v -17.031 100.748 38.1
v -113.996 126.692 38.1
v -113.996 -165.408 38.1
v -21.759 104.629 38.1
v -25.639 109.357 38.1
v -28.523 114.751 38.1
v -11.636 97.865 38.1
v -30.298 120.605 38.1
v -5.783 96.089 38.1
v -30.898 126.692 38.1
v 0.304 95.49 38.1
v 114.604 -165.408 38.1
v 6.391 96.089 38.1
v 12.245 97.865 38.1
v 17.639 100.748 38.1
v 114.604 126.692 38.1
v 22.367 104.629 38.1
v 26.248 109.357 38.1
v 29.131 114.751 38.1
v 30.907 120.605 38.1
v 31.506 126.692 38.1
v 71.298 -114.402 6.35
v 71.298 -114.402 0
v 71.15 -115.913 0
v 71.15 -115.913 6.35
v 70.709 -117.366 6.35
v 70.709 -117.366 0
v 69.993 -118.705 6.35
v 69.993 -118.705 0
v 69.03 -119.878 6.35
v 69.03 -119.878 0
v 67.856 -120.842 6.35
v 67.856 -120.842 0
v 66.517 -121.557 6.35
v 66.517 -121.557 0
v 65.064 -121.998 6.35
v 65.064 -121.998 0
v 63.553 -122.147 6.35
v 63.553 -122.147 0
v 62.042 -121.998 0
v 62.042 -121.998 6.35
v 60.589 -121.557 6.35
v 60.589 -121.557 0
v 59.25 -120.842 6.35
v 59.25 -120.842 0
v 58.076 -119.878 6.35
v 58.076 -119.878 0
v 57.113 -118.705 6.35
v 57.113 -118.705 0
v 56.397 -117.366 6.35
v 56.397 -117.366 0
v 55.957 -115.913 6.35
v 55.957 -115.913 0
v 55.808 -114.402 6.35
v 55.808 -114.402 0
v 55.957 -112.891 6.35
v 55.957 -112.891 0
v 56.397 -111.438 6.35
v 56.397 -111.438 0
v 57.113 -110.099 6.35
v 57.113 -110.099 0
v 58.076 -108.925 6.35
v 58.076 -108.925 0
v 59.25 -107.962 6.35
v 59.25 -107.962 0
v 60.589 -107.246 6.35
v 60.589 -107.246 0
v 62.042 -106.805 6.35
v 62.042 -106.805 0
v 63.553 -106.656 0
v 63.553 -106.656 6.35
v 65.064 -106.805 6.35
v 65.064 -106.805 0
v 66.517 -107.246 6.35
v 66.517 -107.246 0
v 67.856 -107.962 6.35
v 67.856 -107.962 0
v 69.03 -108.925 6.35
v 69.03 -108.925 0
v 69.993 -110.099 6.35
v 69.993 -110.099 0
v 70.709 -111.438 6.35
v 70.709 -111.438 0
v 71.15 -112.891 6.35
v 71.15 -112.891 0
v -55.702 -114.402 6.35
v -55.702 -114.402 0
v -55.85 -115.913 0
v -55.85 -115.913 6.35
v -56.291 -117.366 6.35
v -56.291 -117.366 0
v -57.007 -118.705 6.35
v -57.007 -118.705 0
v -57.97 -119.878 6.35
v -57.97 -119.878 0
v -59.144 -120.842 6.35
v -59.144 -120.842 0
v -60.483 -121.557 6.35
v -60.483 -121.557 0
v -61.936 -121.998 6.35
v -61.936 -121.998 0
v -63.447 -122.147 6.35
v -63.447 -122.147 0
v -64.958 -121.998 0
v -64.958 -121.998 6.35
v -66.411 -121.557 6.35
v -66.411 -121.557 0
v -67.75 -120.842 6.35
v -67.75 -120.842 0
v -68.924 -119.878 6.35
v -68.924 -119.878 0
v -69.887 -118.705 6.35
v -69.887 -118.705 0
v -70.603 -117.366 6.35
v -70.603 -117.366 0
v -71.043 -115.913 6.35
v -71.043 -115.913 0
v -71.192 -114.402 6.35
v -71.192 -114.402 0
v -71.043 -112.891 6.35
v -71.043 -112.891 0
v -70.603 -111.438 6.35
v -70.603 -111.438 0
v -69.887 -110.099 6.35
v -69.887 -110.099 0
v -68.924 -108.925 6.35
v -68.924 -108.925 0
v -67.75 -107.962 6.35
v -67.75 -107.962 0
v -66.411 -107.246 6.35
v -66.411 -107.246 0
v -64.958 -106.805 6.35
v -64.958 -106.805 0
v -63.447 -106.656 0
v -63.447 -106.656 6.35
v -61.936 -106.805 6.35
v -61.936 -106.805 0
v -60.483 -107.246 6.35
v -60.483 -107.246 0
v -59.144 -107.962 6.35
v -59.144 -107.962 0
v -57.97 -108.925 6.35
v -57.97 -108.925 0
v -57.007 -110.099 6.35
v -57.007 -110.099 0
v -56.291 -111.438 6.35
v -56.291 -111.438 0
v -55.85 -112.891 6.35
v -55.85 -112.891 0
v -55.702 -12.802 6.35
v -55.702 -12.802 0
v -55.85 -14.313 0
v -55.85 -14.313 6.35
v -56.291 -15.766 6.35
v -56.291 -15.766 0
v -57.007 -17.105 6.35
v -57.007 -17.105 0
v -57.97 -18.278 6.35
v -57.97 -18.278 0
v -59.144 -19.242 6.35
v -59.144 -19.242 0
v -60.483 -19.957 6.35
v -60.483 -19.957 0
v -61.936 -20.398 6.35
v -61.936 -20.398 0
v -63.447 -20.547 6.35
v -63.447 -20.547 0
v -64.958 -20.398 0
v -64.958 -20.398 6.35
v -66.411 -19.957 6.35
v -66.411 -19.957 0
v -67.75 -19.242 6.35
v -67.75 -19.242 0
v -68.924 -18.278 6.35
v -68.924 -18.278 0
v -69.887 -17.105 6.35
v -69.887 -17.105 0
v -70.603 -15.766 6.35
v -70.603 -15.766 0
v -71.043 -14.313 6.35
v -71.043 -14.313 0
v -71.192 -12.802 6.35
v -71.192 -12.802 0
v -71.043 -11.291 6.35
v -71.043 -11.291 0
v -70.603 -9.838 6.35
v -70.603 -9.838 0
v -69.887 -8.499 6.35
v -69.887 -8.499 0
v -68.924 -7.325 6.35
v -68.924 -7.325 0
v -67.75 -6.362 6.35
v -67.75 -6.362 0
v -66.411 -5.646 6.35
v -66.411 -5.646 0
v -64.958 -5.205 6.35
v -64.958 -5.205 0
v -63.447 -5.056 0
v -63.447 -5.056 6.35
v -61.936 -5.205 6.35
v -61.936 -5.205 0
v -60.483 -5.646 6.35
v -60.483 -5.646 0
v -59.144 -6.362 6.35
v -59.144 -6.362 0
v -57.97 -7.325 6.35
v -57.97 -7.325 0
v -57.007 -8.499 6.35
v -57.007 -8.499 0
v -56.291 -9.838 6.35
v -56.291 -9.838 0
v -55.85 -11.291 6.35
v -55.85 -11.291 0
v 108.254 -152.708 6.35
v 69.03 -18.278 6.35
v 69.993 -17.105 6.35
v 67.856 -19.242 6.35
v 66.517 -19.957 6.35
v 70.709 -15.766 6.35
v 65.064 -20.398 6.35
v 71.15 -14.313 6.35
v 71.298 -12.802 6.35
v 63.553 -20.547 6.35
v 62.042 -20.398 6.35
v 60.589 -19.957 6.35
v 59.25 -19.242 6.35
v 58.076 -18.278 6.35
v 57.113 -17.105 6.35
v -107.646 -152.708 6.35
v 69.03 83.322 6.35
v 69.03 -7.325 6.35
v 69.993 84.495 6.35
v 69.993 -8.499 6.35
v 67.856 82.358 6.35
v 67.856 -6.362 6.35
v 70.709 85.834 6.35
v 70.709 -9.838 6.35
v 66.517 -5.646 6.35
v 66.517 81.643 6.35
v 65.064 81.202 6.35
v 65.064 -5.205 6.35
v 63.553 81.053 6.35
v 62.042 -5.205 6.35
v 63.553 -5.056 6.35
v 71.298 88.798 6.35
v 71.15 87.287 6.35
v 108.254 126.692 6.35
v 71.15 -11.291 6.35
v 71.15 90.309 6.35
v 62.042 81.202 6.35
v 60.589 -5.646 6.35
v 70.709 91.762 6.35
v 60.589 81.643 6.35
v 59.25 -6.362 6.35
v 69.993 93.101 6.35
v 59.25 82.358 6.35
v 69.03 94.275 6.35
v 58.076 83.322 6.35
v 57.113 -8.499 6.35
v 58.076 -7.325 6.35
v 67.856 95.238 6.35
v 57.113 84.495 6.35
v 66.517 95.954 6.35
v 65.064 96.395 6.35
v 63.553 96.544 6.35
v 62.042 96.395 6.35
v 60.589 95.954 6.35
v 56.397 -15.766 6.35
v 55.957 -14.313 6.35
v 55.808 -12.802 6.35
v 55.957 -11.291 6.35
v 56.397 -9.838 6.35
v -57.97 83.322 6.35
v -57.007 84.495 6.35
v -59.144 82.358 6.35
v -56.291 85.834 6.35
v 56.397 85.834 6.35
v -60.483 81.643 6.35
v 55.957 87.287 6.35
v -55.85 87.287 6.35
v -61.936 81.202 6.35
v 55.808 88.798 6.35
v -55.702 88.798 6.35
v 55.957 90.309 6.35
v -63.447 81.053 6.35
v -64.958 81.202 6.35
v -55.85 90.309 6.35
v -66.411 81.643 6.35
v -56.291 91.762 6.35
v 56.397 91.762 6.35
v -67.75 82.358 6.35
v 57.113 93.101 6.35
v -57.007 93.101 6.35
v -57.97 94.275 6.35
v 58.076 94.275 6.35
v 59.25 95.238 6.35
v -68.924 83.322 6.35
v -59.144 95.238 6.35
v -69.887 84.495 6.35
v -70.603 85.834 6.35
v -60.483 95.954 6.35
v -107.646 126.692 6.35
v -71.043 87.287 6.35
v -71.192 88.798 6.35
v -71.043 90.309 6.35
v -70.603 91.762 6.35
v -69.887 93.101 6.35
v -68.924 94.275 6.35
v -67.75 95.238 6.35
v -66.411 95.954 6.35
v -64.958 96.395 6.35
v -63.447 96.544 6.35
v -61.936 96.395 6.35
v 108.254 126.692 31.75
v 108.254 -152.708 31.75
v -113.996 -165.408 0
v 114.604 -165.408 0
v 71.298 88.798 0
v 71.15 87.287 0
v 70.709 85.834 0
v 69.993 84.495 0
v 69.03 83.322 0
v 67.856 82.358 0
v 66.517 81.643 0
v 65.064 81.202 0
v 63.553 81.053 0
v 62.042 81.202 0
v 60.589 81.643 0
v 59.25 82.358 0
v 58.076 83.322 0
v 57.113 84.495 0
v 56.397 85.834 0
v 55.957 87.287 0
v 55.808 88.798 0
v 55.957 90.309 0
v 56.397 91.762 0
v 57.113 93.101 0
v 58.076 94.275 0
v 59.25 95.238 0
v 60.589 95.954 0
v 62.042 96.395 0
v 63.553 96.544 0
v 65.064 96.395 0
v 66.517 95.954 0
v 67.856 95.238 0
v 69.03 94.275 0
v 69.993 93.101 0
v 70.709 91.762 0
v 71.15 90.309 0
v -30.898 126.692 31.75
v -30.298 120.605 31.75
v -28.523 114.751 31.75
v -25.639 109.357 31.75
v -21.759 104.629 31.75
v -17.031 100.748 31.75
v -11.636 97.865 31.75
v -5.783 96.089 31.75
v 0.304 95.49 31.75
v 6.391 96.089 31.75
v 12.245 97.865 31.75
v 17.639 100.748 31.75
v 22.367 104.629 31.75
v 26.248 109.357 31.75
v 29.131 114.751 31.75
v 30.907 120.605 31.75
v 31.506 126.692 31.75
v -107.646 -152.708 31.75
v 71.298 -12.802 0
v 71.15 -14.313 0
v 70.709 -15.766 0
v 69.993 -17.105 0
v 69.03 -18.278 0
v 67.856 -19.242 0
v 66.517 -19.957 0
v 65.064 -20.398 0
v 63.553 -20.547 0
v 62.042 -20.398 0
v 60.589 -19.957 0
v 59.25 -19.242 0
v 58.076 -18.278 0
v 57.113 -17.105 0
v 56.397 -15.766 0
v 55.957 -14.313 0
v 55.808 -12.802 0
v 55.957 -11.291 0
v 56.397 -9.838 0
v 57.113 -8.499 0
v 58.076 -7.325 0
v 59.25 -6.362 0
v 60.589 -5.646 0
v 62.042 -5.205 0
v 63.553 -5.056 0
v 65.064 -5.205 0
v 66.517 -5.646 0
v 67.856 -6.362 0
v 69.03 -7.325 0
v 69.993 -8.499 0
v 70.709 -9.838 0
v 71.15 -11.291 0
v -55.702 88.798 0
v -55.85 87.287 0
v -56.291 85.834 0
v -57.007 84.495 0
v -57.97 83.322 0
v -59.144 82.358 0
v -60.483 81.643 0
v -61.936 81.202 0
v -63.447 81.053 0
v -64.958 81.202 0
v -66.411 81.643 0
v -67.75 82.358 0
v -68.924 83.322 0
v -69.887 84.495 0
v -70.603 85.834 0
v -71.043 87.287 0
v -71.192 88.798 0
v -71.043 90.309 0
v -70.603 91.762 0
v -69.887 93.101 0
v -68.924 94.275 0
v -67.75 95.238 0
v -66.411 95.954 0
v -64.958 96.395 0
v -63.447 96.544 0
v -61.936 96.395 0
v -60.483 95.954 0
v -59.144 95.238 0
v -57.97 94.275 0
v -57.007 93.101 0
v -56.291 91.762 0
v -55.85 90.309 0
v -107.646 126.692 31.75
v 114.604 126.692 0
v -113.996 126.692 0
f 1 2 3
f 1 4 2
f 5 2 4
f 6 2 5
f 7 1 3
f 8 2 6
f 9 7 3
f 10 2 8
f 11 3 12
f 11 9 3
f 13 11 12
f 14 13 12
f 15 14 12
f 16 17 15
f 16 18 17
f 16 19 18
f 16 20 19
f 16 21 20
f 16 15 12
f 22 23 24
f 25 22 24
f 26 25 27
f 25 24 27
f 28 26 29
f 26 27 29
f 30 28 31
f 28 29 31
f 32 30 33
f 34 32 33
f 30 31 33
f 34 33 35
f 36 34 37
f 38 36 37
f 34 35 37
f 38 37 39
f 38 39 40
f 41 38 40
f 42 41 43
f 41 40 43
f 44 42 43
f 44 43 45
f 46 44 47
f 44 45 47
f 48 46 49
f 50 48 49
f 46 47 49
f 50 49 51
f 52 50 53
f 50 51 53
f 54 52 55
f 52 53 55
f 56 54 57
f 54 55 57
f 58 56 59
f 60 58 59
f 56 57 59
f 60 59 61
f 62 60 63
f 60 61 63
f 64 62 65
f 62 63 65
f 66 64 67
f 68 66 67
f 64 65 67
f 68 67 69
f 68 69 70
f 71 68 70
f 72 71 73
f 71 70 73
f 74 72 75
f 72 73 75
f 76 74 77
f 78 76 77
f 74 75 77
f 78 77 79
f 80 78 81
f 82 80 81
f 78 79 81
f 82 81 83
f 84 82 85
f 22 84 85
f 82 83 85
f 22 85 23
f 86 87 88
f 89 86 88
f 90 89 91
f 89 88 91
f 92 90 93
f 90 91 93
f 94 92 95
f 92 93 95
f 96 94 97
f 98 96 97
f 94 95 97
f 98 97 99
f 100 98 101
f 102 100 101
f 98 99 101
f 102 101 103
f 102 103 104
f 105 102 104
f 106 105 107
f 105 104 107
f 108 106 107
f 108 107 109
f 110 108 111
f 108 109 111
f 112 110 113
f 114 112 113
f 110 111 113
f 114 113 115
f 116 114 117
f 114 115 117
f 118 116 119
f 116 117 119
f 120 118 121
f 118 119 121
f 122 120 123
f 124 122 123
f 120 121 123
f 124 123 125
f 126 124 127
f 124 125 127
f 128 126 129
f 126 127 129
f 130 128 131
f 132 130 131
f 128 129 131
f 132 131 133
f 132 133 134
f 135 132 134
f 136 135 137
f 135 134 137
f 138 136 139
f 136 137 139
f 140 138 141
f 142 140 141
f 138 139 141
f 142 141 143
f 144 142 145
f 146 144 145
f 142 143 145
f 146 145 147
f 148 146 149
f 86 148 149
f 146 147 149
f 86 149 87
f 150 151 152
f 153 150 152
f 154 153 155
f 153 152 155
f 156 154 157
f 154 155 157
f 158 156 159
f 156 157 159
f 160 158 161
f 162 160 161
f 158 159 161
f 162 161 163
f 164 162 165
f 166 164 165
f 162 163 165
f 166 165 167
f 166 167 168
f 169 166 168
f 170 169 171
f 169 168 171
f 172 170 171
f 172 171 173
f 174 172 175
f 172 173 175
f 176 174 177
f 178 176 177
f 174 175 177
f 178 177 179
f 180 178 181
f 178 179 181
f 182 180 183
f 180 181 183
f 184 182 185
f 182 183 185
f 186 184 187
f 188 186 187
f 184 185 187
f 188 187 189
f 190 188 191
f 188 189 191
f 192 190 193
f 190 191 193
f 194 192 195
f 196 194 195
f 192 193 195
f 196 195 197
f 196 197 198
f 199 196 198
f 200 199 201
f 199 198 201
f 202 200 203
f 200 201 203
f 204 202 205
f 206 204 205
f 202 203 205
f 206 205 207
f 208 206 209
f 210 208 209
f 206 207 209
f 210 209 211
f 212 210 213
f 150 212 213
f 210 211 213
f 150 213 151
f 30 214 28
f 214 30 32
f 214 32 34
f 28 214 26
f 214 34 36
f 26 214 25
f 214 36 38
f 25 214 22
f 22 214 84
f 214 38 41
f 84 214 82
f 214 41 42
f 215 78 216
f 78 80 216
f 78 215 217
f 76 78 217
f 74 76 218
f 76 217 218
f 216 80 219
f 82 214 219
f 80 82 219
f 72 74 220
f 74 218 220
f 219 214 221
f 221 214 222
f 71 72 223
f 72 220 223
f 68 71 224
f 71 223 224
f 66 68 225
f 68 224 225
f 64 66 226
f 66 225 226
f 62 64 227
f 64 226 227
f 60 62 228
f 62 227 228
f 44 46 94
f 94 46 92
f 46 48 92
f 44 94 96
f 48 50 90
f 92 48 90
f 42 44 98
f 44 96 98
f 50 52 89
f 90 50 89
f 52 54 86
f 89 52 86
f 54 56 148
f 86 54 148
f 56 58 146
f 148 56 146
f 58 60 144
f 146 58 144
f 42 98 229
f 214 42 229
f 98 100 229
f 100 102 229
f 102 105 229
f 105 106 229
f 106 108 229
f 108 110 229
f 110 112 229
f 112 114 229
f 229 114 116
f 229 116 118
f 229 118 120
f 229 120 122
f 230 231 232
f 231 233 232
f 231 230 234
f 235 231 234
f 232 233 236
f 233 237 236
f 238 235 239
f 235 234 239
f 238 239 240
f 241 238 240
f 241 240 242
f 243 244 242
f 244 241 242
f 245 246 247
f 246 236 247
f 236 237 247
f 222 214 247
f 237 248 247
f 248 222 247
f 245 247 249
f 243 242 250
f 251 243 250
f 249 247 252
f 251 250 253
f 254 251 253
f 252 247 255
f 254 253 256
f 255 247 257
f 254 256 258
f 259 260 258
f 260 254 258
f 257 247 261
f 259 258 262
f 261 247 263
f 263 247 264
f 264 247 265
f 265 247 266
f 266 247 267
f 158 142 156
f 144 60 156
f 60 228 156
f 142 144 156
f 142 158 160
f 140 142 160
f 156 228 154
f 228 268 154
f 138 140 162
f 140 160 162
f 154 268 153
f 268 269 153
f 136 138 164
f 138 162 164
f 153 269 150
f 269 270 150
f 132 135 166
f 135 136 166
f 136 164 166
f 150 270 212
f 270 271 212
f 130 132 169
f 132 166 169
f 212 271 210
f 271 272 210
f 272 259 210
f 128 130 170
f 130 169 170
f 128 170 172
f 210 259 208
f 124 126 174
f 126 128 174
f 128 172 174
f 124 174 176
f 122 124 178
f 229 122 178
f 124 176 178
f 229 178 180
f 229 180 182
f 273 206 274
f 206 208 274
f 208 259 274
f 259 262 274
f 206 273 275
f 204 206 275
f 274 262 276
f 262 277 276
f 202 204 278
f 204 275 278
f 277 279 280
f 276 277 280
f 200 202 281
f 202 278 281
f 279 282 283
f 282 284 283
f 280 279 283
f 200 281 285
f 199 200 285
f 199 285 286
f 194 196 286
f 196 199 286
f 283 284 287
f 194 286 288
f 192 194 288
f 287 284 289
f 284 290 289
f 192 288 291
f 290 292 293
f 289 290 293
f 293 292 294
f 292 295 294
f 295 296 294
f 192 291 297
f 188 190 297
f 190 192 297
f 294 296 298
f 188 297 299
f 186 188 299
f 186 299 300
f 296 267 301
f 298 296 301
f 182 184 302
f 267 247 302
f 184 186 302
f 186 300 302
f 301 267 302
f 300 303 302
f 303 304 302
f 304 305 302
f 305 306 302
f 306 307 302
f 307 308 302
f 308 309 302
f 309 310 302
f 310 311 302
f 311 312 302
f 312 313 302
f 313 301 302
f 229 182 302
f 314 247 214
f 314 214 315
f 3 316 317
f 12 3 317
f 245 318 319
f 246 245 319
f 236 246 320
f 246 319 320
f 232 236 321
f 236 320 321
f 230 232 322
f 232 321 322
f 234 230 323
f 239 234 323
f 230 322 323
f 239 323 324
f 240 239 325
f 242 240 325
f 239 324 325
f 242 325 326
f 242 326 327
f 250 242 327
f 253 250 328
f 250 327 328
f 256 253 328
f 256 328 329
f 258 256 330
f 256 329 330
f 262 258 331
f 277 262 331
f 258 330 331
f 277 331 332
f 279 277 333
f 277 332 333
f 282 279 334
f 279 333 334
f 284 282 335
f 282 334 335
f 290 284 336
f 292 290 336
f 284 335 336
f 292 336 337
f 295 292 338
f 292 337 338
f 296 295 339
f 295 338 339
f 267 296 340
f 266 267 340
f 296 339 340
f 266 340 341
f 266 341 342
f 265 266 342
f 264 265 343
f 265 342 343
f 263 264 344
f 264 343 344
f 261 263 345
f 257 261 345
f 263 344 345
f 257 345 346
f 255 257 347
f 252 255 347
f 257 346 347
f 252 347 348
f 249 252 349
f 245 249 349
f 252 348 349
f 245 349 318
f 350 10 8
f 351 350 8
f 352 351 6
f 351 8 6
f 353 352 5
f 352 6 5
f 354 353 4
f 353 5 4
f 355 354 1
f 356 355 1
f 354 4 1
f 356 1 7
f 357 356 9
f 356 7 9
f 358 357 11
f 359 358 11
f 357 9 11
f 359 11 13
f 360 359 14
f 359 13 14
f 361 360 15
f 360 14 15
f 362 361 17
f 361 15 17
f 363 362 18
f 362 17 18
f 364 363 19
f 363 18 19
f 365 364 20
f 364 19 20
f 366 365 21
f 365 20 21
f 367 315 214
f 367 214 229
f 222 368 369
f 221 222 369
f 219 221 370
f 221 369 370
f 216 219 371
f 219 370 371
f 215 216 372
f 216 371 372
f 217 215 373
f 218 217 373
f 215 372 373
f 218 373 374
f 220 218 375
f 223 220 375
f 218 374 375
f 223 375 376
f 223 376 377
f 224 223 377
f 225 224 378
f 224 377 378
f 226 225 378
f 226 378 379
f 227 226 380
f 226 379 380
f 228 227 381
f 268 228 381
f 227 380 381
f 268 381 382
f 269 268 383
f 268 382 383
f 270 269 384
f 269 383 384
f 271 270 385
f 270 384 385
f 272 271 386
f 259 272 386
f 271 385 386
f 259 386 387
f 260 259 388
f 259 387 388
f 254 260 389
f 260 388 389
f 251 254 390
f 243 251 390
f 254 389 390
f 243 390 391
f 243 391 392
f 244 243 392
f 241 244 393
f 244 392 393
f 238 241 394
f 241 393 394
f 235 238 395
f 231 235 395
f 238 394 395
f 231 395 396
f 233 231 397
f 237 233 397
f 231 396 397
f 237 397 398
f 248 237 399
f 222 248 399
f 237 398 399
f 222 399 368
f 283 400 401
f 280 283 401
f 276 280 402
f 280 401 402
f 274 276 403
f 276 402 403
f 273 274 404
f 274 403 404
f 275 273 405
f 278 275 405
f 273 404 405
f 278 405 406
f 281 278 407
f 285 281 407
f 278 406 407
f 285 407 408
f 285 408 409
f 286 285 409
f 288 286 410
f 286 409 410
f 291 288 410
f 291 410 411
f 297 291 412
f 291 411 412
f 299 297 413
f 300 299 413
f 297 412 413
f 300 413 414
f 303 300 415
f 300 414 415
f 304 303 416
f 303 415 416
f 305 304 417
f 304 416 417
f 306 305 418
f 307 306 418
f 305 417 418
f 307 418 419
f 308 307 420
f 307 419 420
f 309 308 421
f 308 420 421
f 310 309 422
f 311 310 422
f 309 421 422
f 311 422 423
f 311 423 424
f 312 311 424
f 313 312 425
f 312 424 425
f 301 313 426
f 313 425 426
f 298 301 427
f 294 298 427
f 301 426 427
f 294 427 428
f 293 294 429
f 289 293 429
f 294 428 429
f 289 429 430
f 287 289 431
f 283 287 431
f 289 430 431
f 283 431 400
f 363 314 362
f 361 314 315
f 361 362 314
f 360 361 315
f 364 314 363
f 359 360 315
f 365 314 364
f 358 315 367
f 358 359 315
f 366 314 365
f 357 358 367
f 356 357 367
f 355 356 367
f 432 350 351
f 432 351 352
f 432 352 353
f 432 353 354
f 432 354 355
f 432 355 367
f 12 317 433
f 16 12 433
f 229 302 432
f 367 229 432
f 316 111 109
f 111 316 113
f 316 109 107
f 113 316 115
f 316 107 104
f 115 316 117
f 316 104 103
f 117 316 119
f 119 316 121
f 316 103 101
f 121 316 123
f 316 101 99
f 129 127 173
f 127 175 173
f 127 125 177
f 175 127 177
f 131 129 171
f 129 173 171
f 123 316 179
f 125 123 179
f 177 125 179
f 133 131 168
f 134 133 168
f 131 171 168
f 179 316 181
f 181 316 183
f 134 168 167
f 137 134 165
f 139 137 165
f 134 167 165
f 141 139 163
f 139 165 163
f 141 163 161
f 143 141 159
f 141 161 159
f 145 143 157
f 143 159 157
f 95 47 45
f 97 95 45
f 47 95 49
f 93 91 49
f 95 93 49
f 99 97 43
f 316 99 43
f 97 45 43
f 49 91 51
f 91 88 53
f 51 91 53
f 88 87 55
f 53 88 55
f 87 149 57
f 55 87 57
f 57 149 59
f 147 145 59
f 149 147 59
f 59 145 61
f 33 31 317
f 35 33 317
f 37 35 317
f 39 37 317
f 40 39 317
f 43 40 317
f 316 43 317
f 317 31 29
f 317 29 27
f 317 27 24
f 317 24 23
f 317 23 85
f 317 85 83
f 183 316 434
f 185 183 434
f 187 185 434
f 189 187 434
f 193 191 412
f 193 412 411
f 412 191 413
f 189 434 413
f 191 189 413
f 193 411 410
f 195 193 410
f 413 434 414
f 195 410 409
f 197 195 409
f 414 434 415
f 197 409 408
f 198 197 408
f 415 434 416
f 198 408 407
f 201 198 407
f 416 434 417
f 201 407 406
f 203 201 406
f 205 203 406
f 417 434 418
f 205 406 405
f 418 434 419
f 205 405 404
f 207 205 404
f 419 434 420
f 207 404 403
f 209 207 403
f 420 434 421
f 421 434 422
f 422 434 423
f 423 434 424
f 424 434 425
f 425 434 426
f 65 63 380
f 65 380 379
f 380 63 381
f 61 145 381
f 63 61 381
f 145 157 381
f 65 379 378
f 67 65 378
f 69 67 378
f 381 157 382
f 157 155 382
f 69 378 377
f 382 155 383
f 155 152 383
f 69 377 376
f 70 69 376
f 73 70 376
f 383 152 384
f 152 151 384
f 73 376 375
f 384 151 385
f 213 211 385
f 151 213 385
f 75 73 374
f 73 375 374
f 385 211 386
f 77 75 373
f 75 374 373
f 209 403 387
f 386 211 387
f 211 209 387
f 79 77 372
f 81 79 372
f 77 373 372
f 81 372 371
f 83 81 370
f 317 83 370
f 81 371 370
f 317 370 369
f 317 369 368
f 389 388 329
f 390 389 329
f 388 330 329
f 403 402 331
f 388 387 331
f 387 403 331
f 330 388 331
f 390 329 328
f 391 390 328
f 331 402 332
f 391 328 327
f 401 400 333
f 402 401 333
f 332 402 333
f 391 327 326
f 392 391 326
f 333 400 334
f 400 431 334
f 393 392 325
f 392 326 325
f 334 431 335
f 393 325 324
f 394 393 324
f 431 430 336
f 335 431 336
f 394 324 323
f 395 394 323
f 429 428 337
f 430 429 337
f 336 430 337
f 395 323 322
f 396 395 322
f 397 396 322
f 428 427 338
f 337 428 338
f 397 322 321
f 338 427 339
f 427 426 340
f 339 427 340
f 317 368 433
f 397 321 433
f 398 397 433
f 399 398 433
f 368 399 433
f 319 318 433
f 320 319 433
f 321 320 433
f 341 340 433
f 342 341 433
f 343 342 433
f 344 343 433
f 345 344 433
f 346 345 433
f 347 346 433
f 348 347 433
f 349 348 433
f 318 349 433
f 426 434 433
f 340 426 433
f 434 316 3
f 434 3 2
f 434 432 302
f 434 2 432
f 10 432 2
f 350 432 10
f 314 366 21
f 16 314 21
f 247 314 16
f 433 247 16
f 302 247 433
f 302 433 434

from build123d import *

# Parameters (mm, degrees)
F0_W     = 228.6
F0_H     = 292.1
F1_DEPTH = 38.1
F2_W     = 215.9
F2_H     = 25.4
F3_DEPTH = 279.4
F4_R     = 31.202064
F5_DEPTH = 6.35
F6_R     = 7.745315
F7_DEPTH = 6.35


with BuildPart() as f1:
    # F0 (on Top) → F1 (new body)
    with BuildSketch(Plane.XY):
        with Locations((0.30422, -19.358111)):
            Rectangle(F0_W, F0_H)
    extrude(amount=F1_DEPTH)

    # F2 (on face) → F3 (cut)
    with BuildSketch(Plane(origin=(0, 126.691889, 0), x_dir=(-1, 0, 0), z_dir=(0, 1, 0))):
        with Locations((-0.30422, 19.05)):
            Rectangle(F2_W, F2_H)
    extrude(amount=-F3_DEPTH, mode=Mode.SUBTRACT)

    # F4 (on face) → F5 (cut)
    with BuildSketch(Plane.XY.offset(38.1)):
        with Locations((0.30422, 126.691889)):
            Circle(F4_R)
    extrude(amount=-F5_DEPTH, mode=Mode.SUBTRACT)

    # F6 (on face) → F7 (cut)
    with BuildSketch(Plane(origin=(0, 0, 0), x_dir=(1, 0, 0), z_dir=(0, 0, -1))):
        with Locations((-63.446887, 114.401668)):
            Circle(F6_R)
        with Locations((-63.446887, 12.801668)):
            Circle(F6_R)
        with Locations((-63.446887, -88.798332)):
            Circle(F6_R)
        with Locations((63.553113, 114.401668)):
            Circle(F6_R)
        with Locations((63.553113, 12.801668)):
            Circle(F6_R)
        with Locations((63.553113, -88.798332)):
            Circle(F6_R)
    extrude(amount=-F7_DEPTH, mode=Mode.SUBTRACT)


solid = f1.part
